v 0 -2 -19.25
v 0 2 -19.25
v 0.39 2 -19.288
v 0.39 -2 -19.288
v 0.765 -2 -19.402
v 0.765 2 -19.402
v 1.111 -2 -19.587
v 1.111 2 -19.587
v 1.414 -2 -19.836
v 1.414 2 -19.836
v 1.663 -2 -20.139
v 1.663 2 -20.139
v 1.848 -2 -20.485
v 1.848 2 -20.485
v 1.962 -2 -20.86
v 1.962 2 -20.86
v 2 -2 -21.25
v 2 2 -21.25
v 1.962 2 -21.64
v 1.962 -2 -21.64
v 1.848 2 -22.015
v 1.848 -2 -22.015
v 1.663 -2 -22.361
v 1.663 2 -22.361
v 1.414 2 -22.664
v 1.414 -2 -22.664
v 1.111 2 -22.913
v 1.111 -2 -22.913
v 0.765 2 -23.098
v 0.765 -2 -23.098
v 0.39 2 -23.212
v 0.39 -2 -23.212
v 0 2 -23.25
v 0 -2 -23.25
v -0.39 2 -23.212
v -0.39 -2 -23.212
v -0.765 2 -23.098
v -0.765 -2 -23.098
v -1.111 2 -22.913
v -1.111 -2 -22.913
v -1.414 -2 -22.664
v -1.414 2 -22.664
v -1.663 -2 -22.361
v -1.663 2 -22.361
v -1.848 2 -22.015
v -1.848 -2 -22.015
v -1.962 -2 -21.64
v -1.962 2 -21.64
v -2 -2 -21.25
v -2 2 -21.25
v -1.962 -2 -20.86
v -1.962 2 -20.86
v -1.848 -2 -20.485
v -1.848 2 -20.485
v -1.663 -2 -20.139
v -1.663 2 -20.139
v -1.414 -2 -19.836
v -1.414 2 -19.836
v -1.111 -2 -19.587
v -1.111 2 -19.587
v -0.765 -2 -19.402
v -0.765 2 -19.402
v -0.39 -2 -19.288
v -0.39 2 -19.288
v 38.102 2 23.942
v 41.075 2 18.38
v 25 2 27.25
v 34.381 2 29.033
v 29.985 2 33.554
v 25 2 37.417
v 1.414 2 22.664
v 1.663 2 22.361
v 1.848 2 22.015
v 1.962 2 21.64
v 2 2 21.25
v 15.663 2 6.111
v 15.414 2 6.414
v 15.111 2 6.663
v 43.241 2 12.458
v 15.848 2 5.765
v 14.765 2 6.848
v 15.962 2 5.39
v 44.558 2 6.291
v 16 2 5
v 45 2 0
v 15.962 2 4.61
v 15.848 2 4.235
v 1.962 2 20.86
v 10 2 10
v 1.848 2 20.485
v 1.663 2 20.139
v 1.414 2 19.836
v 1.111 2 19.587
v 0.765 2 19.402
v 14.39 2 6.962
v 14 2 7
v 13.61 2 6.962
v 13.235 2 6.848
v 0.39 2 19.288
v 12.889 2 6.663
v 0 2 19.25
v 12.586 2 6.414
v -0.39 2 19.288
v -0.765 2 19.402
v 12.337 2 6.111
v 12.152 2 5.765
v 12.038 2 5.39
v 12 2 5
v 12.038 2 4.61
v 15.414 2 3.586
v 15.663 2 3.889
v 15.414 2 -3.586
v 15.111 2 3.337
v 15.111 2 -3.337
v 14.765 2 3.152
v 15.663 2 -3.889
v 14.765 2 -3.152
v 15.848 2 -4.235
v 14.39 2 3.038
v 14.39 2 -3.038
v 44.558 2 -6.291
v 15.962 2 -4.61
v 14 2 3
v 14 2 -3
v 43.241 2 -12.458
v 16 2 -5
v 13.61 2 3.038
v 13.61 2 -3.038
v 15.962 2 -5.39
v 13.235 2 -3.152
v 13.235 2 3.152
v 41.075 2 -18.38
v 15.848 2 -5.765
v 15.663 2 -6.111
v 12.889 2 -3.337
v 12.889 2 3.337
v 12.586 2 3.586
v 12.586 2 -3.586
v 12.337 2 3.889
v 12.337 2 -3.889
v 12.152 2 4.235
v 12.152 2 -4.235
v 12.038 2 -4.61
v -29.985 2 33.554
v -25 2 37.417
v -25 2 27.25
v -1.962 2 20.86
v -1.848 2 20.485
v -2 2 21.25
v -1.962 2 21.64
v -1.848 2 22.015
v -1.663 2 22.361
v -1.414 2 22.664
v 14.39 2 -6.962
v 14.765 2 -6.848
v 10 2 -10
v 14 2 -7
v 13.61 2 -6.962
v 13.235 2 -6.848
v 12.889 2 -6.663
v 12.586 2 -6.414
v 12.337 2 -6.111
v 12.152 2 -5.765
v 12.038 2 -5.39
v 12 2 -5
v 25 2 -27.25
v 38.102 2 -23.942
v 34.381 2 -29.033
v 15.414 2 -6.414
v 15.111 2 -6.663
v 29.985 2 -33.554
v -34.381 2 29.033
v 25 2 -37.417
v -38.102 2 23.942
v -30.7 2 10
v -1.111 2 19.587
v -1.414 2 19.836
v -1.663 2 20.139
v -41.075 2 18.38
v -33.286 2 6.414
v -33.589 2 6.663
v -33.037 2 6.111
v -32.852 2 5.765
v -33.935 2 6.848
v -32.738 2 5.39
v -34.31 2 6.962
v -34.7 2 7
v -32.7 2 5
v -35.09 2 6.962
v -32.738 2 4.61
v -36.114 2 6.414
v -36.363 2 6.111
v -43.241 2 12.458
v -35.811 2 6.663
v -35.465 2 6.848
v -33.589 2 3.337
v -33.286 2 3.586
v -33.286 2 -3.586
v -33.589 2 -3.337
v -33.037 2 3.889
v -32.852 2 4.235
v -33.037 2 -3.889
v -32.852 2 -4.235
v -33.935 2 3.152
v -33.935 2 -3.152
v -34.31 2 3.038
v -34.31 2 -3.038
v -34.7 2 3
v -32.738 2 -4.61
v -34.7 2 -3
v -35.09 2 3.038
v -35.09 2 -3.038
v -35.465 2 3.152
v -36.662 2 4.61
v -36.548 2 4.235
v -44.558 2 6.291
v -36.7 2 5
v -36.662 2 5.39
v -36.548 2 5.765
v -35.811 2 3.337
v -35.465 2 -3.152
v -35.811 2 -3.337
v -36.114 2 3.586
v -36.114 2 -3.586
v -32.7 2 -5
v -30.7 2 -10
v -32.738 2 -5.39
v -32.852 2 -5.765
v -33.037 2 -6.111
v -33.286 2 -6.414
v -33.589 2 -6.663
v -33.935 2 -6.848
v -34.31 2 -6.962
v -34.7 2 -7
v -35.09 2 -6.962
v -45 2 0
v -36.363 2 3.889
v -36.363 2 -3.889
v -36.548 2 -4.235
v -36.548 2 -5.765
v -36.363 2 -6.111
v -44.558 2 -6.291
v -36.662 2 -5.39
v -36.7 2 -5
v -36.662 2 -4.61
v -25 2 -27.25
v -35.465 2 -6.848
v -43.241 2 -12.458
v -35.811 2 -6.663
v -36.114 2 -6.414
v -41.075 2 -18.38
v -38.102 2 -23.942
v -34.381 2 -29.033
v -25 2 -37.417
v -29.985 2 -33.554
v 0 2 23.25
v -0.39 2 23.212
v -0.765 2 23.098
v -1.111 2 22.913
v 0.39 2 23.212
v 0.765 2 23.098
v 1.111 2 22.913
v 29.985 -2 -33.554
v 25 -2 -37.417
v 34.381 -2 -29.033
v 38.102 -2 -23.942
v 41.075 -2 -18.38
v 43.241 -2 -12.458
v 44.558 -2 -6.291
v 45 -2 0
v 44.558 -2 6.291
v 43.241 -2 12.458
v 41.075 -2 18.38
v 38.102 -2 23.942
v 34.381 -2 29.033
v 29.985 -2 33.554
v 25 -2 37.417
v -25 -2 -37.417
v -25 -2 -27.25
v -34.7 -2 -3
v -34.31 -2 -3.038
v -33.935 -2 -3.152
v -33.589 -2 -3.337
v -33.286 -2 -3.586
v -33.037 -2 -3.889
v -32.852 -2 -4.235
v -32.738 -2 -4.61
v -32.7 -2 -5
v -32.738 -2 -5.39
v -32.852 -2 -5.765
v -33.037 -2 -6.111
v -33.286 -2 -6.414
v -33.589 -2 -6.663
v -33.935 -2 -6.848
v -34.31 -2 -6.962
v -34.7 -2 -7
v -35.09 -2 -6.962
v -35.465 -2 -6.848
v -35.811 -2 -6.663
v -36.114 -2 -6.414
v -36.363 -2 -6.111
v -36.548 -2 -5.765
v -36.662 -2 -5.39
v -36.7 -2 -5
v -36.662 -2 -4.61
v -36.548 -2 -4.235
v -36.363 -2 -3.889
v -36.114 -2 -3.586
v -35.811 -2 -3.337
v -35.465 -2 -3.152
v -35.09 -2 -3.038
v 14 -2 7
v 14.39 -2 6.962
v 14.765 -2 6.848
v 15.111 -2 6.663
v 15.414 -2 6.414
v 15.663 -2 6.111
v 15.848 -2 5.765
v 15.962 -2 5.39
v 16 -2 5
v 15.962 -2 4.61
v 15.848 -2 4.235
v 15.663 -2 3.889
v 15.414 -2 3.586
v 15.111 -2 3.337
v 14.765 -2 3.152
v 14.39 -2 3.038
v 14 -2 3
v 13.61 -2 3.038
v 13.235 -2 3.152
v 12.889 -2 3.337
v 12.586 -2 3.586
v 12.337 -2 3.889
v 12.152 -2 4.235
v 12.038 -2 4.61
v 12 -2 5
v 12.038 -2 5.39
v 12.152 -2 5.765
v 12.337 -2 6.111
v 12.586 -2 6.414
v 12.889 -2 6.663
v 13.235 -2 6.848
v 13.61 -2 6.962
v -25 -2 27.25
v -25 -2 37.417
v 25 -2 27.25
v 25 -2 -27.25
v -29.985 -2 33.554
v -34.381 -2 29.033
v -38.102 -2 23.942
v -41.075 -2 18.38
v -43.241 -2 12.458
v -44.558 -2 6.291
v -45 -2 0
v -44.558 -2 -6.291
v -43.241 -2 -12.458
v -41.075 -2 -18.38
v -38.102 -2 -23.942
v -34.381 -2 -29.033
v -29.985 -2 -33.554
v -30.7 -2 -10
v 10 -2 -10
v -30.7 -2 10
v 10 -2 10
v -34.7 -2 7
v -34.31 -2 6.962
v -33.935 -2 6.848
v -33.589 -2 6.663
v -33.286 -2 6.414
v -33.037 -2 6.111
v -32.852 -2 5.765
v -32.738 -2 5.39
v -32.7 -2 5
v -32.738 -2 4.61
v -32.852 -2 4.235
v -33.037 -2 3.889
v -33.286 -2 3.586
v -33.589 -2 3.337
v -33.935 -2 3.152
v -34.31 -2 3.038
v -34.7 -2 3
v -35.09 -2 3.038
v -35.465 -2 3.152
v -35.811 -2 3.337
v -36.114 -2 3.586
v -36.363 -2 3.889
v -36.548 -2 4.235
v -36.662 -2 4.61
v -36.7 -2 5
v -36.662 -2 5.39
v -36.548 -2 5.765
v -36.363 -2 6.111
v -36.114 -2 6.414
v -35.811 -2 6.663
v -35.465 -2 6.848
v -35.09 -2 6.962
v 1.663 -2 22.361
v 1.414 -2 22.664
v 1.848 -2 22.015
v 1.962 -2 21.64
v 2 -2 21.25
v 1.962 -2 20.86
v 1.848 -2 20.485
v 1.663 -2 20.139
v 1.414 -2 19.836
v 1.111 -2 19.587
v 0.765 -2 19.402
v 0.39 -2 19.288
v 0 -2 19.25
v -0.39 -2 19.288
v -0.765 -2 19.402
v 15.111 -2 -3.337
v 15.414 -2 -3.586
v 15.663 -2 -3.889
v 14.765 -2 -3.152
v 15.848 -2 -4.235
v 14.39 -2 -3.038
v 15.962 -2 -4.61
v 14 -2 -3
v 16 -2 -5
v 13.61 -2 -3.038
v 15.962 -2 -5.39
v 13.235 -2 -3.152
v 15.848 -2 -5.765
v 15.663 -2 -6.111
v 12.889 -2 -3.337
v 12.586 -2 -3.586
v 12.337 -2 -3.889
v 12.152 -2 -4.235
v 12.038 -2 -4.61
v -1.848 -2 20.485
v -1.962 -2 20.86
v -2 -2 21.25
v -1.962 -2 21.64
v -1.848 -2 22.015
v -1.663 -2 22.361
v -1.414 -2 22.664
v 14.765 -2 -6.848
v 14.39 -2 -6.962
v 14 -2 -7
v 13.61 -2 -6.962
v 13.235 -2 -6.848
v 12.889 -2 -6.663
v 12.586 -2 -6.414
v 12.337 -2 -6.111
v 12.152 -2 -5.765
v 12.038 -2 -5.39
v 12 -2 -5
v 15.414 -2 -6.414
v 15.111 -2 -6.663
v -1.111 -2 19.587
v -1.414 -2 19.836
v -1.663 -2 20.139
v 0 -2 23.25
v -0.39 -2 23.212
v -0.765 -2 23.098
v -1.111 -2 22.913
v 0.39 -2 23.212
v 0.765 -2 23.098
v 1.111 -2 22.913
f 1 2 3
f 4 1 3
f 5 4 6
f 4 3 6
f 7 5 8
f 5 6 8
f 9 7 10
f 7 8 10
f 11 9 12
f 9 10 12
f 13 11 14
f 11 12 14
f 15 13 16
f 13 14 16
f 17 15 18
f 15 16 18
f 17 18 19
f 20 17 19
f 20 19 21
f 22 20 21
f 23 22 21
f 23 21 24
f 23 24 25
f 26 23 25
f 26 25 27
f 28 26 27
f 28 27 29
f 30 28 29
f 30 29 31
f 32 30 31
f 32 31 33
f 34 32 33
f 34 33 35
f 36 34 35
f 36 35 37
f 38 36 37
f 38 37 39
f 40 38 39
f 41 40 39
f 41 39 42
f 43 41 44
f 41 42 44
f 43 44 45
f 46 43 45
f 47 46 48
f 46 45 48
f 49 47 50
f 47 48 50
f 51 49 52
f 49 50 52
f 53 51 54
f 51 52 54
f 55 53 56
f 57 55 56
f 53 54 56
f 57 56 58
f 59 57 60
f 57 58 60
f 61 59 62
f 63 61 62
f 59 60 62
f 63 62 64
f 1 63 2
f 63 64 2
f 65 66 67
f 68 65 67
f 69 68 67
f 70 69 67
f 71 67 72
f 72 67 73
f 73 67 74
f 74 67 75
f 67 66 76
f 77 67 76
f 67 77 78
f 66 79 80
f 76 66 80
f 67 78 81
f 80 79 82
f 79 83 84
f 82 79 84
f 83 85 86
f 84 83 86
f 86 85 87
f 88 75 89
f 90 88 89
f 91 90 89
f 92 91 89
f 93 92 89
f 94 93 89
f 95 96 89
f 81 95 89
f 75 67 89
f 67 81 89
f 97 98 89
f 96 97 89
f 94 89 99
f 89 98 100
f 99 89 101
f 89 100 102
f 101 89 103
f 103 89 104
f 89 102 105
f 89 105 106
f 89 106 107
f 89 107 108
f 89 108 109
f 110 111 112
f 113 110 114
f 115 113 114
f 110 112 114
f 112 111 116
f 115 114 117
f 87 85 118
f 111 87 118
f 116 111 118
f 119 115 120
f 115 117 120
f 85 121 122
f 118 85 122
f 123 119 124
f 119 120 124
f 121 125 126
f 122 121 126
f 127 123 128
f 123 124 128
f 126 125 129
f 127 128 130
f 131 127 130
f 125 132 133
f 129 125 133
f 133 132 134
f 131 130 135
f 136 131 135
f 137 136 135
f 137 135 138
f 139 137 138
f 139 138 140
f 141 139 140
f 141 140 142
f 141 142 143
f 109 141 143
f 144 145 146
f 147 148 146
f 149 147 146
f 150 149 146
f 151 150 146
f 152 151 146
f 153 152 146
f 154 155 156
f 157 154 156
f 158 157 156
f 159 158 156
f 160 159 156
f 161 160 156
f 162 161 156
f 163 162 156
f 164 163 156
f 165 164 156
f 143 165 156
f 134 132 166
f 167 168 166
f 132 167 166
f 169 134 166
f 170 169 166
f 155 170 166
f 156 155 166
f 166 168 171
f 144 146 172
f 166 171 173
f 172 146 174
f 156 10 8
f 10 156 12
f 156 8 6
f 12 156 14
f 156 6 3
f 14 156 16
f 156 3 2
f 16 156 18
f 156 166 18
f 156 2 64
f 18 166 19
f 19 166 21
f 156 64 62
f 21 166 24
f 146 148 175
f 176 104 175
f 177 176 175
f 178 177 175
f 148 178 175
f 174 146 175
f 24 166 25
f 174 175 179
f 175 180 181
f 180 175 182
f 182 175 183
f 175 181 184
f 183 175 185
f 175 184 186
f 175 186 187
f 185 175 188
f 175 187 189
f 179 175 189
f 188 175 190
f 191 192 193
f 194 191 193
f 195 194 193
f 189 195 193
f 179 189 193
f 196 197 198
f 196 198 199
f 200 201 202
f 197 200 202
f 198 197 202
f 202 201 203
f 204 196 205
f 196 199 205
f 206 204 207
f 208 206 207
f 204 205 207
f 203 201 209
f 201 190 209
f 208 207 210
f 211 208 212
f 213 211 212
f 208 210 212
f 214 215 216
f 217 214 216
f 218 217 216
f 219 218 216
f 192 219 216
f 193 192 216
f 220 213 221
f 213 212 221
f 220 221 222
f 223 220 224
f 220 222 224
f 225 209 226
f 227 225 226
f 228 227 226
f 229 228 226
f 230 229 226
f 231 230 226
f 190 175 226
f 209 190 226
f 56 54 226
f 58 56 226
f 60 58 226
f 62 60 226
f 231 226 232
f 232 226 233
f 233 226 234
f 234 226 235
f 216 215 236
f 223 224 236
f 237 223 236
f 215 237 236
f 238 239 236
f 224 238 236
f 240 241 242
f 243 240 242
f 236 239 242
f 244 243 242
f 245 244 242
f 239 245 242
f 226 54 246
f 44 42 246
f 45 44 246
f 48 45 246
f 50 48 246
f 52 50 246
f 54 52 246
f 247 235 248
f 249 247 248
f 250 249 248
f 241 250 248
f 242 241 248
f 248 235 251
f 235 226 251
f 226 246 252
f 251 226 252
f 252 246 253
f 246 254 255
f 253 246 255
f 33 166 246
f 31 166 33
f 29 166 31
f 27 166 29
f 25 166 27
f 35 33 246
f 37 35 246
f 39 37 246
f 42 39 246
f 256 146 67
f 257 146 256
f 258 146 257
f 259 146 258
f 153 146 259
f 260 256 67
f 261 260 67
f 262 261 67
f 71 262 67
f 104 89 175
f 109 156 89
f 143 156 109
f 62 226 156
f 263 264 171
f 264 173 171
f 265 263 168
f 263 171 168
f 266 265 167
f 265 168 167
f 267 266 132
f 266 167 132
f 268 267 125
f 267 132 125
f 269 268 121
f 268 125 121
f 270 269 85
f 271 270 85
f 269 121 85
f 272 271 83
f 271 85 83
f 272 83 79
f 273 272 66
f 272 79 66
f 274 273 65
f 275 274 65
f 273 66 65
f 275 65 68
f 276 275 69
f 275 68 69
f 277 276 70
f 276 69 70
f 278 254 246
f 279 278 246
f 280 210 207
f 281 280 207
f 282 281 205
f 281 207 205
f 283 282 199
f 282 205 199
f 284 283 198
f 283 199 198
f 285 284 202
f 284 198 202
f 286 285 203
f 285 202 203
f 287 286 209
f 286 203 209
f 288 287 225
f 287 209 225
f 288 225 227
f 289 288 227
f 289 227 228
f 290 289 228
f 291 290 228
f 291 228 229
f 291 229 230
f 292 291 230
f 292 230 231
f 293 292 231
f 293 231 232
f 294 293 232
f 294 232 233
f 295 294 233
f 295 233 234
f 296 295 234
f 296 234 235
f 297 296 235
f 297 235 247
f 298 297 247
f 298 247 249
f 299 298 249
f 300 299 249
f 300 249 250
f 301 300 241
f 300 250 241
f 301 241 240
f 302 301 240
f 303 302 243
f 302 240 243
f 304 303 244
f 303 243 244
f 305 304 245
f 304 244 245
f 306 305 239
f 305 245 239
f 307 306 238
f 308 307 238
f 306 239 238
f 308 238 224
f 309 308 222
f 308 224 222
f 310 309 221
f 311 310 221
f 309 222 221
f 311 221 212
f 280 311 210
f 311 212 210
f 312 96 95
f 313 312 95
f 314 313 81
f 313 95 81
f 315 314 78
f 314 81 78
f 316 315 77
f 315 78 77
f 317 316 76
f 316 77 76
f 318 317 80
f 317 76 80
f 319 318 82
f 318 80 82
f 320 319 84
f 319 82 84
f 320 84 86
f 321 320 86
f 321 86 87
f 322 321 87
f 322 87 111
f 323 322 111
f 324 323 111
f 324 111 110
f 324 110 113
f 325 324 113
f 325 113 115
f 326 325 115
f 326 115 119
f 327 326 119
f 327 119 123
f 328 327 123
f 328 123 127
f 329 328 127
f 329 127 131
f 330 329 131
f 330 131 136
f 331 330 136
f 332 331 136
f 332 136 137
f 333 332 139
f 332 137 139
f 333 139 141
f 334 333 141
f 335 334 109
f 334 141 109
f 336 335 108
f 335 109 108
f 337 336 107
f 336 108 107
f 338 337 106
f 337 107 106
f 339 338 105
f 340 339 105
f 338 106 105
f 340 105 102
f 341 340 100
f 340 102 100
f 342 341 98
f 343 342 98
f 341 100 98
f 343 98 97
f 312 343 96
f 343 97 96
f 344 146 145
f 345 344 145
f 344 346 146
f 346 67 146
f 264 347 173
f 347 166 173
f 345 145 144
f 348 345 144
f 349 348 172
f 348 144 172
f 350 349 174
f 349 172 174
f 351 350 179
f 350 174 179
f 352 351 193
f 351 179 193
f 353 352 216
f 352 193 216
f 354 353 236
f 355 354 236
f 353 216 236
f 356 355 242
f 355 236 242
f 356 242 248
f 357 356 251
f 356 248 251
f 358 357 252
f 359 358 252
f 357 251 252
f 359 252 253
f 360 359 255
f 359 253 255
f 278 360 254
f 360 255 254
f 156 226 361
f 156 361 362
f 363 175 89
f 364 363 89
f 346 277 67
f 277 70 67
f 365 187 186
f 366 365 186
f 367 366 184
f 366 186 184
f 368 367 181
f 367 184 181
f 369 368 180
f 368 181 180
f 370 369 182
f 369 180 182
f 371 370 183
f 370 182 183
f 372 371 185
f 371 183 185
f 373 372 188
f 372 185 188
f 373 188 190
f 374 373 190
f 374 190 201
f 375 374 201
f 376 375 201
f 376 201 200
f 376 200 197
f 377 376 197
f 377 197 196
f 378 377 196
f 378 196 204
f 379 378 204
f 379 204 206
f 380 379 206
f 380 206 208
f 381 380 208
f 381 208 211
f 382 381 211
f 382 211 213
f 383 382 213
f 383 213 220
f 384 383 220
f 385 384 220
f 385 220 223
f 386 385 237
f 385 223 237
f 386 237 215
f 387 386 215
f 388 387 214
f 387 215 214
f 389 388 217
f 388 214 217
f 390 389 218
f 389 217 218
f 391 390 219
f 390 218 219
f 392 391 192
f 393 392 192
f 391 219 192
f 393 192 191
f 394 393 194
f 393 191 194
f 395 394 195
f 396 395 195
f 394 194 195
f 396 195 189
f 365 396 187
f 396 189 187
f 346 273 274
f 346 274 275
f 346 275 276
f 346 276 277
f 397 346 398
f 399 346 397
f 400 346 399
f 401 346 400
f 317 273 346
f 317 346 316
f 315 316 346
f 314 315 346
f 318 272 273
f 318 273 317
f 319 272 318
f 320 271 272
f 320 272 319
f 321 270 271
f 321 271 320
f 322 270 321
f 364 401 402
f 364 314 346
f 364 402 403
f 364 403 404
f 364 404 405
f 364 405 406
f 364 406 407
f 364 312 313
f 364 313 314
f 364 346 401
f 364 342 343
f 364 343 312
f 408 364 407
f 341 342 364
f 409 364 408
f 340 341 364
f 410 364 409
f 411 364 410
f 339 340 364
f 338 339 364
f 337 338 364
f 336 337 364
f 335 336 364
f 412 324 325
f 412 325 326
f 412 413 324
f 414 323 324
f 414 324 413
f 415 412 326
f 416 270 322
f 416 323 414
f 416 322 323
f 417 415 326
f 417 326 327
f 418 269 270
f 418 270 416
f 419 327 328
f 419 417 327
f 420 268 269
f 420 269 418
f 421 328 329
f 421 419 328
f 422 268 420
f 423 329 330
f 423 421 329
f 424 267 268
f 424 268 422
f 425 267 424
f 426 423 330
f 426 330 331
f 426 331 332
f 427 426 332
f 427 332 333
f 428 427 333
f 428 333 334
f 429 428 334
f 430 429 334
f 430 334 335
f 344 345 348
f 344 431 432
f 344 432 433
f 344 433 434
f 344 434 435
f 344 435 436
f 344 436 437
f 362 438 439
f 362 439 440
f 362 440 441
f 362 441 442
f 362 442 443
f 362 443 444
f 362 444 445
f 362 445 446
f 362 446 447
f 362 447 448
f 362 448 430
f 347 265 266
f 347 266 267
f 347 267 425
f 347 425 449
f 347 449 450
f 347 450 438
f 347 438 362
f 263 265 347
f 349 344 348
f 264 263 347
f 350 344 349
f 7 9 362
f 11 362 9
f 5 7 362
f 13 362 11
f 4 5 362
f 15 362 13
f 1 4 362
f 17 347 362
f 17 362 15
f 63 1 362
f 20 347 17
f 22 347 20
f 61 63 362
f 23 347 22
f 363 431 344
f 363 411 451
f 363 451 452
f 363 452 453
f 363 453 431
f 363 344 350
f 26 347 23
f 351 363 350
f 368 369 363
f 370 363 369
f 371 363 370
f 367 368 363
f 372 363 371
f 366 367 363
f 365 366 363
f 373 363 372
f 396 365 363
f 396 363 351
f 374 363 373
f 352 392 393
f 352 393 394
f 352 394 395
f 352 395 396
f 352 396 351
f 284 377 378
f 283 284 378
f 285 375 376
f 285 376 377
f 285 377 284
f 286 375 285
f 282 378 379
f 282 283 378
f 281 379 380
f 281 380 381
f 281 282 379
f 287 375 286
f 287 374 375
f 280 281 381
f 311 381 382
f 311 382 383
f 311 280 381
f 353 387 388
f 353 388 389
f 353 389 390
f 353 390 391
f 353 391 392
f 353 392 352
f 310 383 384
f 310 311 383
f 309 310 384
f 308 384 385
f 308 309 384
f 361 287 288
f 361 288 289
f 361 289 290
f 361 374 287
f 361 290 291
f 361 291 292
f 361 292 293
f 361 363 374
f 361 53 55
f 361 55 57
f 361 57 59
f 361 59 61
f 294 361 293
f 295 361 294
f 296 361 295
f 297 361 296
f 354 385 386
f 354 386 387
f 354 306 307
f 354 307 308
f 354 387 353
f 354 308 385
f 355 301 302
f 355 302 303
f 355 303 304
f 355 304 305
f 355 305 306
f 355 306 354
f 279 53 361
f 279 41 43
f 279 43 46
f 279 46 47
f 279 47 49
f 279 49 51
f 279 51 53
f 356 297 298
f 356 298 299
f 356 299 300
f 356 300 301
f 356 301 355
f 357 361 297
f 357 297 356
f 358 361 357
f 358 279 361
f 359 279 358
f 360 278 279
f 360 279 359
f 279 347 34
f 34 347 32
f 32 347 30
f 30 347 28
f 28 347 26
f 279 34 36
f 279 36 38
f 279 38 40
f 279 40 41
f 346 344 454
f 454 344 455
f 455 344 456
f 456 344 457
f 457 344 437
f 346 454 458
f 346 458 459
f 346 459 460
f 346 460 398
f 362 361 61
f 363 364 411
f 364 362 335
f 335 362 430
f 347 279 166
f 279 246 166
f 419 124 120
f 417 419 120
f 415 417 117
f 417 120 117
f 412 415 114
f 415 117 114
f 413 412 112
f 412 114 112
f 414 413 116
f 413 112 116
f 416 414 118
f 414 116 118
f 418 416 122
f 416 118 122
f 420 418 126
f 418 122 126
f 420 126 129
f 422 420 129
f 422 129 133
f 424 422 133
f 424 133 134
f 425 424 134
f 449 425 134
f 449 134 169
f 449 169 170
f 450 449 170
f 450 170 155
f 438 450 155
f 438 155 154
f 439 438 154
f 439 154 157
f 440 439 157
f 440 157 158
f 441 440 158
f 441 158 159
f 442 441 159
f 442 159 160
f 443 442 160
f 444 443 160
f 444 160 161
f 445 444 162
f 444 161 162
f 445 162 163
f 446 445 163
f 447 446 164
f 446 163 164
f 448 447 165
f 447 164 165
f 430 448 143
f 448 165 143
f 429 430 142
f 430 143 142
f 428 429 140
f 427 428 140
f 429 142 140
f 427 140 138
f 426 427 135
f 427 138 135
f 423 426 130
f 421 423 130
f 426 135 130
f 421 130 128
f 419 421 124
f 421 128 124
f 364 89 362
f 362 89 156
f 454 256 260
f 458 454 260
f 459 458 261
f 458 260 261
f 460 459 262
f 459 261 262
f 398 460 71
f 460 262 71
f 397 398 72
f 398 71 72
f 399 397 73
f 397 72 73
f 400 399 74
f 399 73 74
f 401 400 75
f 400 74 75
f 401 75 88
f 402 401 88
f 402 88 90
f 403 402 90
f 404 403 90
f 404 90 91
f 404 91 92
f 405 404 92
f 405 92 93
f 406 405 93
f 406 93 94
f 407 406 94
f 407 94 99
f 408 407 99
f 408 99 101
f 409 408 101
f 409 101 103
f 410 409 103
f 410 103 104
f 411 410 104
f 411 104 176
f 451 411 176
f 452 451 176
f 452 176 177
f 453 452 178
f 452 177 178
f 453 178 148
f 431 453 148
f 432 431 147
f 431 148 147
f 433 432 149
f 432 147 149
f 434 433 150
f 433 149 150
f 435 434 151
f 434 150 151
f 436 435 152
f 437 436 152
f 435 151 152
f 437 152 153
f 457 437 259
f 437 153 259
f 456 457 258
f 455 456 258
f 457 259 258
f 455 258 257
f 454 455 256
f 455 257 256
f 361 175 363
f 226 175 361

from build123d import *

# Parameters (mm, degrees)
ESTRUSIONE_ESTRUSIONE1_DEPTH = 2
CROQUIS2_R                   = 2
CROQUIS2_W                   = 40.7
CROQUIS2_H                   = 20
CORTAR_EXTRUIR1_DEPTH        = 59.660037504


with BuildPart() as part:
    # Schizzo1 → Estrusione-Estrusione1 (new, symmetric)
    with BuildSketch(Plane(origin=(0, 0, 0), x_dir=(1, 0, 0), z_dir=(0, 1, 0))):
        with BuildLine():
            Line((-25, 37.416573868), (-25, 27.25))
            Line((-25, 27.25), (25, 27.25))
            Line((25, 27.25), (25, 37.416573868))
            ThreePointArc((25, 37.416573868), (45, 0), (25, -37.416573868))
            Line((25, -37.416573868), (25, -27.25))
            Line((25, -27.25), (-25, -27.25))
            Line((-25, -27.25), (-25, -37.416573868))
            ThreePointArc((-25, -37.416573868), (-45, 0), (-25, 37.416573868))
        make_face()
    extrude(amount=ESTRUSIONE_ESTRUSIONE1_DEPTH, both=True)

    # Croquis2 → Cortar-Extruir1 (cut, through all)
    with BuildSketch(Plane(origin=(0, 2, 0), x_dir=(1, 0, 0), z_dir=(0, 1, 0))):
        with Locations(Location((-34.7, 5, 0), (0, 0, 270))):
            Circle(CROQUIS2_R)
        with Locations(Location((-34.7, -5, 0), (0, 0, 270))):
            Circle(CROQUIS2_R)
        with Locations(Location((14, 5, 0), (0, 0, 270))):
            Circle(CROQUIS2_R)
        with Locations(Location((14, -5, 0), (0, 0, 270))):
            Circle(CROQUIS2_R)
        with Locations(Location((0, 21.25, 0), (0, 0, 270))):
            Circle(CROQUIS2_R)
        with Locations(Location((0, -21.25, 0), (0, 0, 270))):
            Circle(CROQUIS2_R)
        with Locations((-10.35, 0)):
            Rectangle(CROQUIS2_W, CROQUIS2_H)
    extrude(amount=-CORTAR_EXTRUIR1_DEPTH, mode=Mode.SUBTRACT)


solid = part.part
